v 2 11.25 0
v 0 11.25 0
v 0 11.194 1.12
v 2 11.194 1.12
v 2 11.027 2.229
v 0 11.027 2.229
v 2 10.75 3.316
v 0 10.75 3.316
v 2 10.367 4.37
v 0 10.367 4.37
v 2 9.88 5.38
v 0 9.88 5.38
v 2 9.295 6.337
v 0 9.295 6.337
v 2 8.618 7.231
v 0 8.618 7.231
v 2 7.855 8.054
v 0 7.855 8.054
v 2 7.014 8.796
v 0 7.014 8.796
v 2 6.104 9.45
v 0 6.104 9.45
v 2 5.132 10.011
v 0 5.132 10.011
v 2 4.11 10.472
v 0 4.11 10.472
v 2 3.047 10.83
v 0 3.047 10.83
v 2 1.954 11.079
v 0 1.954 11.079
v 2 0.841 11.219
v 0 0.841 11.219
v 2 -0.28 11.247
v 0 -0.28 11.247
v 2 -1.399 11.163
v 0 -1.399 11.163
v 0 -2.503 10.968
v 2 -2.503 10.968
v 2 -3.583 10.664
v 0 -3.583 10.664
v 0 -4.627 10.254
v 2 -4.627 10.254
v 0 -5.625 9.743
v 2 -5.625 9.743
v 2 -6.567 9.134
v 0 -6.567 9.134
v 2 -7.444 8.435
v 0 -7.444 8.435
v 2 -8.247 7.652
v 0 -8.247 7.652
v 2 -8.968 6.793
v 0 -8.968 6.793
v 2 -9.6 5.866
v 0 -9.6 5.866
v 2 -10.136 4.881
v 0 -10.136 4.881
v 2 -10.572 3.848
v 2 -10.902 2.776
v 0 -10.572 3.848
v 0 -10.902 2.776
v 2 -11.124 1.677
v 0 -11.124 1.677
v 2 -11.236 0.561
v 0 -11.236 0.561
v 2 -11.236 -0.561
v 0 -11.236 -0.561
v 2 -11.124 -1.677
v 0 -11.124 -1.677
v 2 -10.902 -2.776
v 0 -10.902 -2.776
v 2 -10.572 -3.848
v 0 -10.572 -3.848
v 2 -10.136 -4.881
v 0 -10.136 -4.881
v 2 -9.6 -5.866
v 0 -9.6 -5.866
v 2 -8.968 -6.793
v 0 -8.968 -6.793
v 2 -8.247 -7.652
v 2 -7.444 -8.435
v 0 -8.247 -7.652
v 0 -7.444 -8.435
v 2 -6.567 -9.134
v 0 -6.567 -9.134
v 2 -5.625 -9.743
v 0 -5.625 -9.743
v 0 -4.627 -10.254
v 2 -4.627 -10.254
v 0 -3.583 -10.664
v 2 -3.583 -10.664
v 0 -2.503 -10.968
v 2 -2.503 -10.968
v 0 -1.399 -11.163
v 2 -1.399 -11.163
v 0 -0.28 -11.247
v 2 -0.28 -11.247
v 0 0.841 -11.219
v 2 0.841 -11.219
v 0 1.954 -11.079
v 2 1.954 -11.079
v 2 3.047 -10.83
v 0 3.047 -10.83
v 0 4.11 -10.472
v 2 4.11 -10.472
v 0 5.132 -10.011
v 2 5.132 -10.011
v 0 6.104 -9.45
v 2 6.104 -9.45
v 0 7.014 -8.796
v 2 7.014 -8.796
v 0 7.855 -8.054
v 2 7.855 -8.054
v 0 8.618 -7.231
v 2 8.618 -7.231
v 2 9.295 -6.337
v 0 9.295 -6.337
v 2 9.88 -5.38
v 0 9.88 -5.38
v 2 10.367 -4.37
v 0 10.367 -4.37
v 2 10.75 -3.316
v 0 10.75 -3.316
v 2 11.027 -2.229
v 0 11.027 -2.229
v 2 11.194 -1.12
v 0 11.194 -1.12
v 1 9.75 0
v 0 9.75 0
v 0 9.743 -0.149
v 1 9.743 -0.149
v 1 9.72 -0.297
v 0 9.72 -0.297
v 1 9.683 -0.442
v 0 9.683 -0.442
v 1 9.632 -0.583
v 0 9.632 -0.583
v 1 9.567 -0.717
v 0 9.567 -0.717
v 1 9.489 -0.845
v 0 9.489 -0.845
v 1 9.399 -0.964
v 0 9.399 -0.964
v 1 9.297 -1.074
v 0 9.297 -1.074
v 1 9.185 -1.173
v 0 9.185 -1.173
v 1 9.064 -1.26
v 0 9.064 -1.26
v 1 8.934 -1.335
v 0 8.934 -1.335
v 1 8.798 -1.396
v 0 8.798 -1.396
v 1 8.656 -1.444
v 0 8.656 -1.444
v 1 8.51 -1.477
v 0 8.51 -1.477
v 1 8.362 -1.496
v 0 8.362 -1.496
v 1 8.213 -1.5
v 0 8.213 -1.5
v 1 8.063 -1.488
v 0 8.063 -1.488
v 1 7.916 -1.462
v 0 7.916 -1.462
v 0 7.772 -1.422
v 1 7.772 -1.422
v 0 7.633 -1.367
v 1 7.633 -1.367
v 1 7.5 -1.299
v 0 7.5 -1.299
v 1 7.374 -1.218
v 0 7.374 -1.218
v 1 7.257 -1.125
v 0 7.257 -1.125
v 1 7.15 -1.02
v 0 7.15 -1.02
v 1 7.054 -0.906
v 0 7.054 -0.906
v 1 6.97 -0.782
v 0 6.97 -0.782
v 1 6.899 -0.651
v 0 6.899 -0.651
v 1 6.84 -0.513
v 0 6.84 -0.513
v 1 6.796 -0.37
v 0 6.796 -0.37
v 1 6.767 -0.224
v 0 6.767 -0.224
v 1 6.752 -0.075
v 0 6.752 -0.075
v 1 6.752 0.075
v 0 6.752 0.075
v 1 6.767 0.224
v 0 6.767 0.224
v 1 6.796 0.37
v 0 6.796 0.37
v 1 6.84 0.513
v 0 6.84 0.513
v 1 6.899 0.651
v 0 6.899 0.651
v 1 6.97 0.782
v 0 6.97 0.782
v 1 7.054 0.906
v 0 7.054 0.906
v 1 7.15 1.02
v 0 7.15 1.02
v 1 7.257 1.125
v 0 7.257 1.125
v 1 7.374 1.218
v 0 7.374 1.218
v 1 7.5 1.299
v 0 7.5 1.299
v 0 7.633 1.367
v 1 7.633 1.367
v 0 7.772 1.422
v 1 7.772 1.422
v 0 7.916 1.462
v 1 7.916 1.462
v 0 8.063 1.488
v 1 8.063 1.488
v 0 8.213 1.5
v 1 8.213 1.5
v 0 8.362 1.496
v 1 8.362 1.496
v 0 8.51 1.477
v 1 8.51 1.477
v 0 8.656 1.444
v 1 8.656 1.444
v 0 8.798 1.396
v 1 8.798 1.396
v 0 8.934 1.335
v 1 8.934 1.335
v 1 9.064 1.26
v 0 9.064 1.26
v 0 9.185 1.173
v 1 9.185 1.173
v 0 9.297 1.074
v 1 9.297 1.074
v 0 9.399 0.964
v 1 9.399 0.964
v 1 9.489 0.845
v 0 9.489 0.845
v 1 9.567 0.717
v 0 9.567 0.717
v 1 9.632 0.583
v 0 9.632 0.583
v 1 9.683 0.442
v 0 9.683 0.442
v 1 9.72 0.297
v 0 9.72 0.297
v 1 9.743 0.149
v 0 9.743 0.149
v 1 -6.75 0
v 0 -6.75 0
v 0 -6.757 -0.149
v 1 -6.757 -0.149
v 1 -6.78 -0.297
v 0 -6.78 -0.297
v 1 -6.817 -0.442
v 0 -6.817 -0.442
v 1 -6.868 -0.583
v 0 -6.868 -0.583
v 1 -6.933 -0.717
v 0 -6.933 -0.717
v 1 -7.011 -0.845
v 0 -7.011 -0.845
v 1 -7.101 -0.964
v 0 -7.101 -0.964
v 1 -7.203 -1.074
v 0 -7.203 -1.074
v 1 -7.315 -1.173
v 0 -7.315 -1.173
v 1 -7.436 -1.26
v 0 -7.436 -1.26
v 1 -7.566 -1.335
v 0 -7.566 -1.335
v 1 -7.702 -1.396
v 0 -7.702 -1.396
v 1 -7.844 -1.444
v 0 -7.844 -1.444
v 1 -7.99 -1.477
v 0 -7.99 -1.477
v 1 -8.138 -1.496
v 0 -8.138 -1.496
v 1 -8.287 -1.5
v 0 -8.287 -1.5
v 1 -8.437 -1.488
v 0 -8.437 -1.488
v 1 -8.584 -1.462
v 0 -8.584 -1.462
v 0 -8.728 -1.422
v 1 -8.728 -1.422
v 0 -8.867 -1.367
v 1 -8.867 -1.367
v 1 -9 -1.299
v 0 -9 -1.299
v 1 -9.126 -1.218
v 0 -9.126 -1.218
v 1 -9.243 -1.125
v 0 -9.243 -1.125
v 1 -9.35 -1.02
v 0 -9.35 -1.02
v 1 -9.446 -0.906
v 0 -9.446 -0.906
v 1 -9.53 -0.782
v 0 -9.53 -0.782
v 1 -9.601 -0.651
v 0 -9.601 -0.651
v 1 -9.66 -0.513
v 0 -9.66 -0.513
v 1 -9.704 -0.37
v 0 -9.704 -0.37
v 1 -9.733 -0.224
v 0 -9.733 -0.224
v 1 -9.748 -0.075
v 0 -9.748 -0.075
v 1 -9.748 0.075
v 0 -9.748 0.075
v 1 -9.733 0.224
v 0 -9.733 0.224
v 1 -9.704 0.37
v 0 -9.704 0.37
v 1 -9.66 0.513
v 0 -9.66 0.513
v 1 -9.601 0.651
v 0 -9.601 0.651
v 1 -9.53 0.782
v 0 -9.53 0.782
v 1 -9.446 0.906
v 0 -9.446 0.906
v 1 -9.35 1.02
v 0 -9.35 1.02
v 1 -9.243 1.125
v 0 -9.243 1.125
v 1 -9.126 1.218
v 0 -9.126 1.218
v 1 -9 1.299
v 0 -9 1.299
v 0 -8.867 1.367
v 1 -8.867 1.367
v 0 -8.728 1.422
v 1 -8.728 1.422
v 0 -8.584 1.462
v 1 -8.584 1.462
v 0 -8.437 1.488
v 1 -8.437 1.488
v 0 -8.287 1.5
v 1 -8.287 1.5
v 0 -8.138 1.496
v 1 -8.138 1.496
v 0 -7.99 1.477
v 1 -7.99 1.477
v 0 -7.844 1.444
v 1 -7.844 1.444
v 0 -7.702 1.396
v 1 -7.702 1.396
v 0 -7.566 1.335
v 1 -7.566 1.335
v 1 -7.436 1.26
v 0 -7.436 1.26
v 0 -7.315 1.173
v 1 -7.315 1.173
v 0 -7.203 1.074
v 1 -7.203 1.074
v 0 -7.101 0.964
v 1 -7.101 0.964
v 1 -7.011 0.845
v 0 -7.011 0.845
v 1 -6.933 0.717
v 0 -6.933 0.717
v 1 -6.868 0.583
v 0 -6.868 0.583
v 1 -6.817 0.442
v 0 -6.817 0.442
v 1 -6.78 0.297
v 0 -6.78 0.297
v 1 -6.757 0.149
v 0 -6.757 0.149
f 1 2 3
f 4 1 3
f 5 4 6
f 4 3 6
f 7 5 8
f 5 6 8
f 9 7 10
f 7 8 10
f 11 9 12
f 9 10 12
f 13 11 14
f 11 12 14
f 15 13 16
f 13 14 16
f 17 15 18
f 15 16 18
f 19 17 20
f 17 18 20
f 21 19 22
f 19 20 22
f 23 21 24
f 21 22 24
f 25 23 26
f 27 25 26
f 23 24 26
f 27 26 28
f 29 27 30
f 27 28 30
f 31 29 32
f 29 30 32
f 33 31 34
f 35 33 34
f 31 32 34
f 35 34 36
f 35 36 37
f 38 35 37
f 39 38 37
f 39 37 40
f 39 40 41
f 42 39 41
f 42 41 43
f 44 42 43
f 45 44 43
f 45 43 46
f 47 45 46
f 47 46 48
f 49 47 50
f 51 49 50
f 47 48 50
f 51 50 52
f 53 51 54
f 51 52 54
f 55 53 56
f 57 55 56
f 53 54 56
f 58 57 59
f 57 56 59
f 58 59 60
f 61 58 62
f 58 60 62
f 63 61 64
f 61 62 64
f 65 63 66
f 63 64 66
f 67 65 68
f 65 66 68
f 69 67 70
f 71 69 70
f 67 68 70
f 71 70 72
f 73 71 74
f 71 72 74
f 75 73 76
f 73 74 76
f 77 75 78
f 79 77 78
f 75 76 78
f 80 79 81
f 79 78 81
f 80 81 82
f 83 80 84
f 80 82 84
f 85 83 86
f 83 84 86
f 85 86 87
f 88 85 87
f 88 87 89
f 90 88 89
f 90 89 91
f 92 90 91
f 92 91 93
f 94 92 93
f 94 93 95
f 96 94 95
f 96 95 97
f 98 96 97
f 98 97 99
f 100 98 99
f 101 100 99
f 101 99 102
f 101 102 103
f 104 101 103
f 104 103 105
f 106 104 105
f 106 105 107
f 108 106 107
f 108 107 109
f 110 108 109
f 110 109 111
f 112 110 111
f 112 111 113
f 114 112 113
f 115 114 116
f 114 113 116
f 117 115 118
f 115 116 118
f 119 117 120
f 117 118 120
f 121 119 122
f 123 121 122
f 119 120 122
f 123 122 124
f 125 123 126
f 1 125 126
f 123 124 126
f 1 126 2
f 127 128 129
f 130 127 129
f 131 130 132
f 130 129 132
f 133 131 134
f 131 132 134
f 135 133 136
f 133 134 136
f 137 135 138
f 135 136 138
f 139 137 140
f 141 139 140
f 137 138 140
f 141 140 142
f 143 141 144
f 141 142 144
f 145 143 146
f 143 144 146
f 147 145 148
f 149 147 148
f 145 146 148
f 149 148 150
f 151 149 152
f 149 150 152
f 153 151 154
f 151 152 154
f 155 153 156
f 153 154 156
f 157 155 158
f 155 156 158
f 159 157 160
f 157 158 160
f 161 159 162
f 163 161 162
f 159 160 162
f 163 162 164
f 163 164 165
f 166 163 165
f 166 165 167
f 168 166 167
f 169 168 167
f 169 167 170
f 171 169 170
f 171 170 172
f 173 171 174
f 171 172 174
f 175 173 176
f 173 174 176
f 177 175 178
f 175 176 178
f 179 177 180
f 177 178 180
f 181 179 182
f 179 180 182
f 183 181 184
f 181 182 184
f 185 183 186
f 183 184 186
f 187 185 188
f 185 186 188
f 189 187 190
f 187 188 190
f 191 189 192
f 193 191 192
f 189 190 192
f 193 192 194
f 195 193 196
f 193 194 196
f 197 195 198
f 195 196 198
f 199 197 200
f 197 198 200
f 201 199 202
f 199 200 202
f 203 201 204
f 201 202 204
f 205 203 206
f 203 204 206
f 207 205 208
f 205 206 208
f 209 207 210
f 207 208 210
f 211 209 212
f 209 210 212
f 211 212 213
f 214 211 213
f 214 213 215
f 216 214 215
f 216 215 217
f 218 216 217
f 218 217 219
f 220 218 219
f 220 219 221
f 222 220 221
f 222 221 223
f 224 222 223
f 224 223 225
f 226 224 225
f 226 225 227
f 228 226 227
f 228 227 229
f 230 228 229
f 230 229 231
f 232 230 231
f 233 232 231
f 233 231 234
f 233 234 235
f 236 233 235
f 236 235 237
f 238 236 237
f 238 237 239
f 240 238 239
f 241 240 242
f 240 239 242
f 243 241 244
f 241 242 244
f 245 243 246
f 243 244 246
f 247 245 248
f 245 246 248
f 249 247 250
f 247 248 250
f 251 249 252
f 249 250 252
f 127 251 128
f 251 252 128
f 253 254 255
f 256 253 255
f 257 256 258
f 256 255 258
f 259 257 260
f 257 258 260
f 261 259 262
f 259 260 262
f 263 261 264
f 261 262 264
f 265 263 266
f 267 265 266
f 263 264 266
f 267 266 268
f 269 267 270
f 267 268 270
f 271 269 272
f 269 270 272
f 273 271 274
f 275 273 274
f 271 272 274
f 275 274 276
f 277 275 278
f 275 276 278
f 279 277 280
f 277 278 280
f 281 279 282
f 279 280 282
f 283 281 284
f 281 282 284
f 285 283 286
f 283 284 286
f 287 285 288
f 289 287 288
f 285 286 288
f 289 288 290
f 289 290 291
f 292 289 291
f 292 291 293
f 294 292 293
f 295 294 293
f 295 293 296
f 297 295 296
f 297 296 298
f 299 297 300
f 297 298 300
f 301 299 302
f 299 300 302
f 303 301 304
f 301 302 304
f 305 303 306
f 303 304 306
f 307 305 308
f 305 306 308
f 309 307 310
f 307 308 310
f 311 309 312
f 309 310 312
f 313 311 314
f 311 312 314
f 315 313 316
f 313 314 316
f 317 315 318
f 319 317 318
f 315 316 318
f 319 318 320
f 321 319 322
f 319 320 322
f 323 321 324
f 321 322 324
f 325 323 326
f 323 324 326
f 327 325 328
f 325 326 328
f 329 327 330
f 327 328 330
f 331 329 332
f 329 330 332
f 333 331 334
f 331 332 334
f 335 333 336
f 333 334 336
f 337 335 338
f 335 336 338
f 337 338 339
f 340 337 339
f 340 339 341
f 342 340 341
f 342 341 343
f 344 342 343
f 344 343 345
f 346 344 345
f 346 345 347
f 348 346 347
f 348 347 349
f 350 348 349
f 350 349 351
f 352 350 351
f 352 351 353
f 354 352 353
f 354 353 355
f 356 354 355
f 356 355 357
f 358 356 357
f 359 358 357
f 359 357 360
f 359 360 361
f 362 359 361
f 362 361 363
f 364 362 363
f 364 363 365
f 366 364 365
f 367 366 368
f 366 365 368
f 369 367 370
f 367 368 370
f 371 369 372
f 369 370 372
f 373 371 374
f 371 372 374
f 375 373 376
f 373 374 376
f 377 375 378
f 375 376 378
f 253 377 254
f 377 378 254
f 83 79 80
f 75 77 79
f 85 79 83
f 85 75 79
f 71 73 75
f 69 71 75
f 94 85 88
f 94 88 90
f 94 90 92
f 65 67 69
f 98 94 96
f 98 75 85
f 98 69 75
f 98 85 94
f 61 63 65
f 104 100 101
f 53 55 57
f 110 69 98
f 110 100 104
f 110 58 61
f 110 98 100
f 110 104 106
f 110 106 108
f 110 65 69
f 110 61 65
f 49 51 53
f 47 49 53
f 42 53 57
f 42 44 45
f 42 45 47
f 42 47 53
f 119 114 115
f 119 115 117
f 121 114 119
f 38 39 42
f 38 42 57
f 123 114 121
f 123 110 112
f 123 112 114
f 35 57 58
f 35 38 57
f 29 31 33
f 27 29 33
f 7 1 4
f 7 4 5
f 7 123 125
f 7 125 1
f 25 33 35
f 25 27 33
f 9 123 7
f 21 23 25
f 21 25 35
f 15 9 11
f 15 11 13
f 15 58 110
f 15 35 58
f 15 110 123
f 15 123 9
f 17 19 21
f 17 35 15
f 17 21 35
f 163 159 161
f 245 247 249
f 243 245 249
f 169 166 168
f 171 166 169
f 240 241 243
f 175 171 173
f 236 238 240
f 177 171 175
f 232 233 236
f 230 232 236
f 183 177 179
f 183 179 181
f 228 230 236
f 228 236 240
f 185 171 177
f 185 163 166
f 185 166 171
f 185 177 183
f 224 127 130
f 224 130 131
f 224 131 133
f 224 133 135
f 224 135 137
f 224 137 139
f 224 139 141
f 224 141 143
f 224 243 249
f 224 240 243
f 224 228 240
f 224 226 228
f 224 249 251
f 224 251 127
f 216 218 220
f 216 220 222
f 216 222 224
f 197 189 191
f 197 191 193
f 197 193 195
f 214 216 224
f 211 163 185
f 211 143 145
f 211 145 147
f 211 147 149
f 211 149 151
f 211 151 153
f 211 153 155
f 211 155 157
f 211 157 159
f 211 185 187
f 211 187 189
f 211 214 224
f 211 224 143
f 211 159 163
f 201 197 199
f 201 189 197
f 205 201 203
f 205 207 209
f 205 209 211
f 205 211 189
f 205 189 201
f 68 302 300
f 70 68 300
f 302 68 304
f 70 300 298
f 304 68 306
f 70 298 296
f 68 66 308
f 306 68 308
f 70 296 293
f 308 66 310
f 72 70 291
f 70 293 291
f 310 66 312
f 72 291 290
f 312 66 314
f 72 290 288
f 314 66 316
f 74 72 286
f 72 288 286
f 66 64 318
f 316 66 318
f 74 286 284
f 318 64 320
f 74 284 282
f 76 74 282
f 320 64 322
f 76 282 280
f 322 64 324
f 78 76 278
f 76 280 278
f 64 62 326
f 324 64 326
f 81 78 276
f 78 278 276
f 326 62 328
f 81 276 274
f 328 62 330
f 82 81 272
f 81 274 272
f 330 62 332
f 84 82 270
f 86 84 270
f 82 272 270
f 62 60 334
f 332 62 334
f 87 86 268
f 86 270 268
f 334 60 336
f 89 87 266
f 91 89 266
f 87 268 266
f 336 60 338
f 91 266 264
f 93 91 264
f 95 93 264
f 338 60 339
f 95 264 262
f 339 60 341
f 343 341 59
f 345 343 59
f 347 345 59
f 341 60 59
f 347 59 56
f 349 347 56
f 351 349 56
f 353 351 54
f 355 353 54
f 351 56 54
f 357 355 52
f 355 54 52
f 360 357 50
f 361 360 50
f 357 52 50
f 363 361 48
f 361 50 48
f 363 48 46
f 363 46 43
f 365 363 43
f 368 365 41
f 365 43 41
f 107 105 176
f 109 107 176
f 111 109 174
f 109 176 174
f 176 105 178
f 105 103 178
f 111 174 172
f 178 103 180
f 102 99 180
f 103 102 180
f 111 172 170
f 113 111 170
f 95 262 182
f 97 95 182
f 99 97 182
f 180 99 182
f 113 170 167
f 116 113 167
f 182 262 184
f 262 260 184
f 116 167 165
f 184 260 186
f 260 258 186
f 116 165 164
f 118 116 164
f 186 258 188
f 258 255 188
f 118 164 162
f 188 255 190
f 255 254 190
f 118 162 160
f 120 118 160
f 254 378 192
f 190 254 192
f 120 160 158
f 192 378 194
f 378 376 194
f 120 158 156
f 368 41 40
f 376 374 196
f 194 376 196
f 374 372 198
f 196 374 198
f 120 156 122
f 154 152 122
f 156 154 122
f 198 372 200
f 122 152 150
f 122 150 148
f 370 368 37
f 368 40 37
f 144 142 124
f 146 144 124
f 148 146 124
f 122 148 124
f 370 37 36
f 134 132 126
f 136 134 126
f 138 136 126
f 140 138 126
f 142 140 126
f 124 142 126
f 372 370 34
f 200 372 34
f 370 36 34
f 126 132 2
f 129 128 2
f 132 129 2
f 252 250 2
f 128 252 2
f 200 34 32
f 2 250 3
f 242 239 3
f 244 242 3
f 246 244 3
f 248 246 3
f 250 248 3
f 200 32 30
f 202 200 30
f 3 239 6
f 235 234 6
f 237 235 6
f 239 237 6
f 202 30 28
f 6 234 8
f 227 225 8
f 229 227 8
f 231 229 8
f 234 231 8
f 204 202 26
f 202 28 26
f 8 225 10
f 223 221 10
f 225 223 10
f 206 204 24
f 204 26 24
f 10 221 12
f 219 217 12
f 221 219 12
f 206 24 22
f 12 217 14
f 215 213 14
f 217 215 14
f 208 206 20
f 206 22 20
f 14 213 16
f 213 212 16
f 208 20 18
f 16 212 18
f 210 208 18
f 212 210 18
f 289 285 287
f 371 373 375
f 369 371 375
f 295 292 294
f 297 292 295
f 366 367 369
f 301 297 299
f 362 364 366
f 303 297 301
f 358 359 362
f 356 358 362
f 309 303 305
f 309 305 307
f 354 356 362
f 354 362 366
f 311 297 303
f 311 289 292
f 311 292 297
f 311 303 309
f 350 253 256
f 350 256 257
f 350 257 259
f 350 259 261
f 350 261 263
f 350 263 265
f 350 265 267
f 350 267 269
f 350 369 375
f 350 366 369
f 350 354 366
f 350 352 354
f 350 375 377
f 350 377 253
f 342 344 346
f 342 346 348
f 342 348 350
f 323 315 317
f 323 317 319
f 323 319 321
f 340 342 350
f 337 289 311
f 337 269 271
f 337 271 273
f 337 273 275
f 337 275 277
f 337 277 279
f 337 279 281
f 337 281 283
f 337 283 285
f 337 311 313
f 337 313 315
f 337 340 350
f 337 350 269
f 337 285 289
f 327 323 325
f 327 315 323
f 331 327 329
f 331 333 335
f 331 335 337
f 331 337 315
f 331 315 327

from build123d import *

# Parameters (mm, degrees)
F0_R     = 11.25
F1_DEPTH = 2
F3_DEPTH = 1


with BuildPart() as f1:
    # F0 (on Right) → F1 (new body)
    with BuildSketch(Plane.YZ):
        Circle(F0_R)
    extrude(amount=F1_DEPTH)

    # F2 (on face) → F3 (cut)
    with BuildSketch(Plane(origin=(0, 0, 0), x_dir=(0, -1, 0), z_dir=(-1, 0, 0))):
        with BuildLine():
            Line((-9.75, 0), (-8.25, 0))
            Line((-8.25, 0), (-6.75, 0))
            ThreePointArc((-6.75, 0), (-8.25, 1.5), (-9.75, 0))
        make_face()
        with BuildLine():
            Line((-6.75, 0), (-8.25, 0))
            Line((-8.25, 0), (-9.75, 0))
            ThreePointArc((-9.75, 0), (-8.25, -1.5), (-6.75, 0))
        make_face()
        with BuildLine():
            ThreePointArc((9.75, 0), (8.25, 1.5), (6.75, 0))
            Line((6.75, 0), (8.25, 0))
            Line((8.25, 0), (9.75, 0))
        make_face()
        with BuildLine():
            Line((8.25, 0), (6.75, 0))
            ThreePointArc((6.75, 0), (8.25, -1.5), (9.75, 0))
            Line((9.75, 0), (8.25, 0))
        make_face()
    extrude(amount=-F3_DEPTH, mode=Mode.SUBTRACT)


solid = f1.part
